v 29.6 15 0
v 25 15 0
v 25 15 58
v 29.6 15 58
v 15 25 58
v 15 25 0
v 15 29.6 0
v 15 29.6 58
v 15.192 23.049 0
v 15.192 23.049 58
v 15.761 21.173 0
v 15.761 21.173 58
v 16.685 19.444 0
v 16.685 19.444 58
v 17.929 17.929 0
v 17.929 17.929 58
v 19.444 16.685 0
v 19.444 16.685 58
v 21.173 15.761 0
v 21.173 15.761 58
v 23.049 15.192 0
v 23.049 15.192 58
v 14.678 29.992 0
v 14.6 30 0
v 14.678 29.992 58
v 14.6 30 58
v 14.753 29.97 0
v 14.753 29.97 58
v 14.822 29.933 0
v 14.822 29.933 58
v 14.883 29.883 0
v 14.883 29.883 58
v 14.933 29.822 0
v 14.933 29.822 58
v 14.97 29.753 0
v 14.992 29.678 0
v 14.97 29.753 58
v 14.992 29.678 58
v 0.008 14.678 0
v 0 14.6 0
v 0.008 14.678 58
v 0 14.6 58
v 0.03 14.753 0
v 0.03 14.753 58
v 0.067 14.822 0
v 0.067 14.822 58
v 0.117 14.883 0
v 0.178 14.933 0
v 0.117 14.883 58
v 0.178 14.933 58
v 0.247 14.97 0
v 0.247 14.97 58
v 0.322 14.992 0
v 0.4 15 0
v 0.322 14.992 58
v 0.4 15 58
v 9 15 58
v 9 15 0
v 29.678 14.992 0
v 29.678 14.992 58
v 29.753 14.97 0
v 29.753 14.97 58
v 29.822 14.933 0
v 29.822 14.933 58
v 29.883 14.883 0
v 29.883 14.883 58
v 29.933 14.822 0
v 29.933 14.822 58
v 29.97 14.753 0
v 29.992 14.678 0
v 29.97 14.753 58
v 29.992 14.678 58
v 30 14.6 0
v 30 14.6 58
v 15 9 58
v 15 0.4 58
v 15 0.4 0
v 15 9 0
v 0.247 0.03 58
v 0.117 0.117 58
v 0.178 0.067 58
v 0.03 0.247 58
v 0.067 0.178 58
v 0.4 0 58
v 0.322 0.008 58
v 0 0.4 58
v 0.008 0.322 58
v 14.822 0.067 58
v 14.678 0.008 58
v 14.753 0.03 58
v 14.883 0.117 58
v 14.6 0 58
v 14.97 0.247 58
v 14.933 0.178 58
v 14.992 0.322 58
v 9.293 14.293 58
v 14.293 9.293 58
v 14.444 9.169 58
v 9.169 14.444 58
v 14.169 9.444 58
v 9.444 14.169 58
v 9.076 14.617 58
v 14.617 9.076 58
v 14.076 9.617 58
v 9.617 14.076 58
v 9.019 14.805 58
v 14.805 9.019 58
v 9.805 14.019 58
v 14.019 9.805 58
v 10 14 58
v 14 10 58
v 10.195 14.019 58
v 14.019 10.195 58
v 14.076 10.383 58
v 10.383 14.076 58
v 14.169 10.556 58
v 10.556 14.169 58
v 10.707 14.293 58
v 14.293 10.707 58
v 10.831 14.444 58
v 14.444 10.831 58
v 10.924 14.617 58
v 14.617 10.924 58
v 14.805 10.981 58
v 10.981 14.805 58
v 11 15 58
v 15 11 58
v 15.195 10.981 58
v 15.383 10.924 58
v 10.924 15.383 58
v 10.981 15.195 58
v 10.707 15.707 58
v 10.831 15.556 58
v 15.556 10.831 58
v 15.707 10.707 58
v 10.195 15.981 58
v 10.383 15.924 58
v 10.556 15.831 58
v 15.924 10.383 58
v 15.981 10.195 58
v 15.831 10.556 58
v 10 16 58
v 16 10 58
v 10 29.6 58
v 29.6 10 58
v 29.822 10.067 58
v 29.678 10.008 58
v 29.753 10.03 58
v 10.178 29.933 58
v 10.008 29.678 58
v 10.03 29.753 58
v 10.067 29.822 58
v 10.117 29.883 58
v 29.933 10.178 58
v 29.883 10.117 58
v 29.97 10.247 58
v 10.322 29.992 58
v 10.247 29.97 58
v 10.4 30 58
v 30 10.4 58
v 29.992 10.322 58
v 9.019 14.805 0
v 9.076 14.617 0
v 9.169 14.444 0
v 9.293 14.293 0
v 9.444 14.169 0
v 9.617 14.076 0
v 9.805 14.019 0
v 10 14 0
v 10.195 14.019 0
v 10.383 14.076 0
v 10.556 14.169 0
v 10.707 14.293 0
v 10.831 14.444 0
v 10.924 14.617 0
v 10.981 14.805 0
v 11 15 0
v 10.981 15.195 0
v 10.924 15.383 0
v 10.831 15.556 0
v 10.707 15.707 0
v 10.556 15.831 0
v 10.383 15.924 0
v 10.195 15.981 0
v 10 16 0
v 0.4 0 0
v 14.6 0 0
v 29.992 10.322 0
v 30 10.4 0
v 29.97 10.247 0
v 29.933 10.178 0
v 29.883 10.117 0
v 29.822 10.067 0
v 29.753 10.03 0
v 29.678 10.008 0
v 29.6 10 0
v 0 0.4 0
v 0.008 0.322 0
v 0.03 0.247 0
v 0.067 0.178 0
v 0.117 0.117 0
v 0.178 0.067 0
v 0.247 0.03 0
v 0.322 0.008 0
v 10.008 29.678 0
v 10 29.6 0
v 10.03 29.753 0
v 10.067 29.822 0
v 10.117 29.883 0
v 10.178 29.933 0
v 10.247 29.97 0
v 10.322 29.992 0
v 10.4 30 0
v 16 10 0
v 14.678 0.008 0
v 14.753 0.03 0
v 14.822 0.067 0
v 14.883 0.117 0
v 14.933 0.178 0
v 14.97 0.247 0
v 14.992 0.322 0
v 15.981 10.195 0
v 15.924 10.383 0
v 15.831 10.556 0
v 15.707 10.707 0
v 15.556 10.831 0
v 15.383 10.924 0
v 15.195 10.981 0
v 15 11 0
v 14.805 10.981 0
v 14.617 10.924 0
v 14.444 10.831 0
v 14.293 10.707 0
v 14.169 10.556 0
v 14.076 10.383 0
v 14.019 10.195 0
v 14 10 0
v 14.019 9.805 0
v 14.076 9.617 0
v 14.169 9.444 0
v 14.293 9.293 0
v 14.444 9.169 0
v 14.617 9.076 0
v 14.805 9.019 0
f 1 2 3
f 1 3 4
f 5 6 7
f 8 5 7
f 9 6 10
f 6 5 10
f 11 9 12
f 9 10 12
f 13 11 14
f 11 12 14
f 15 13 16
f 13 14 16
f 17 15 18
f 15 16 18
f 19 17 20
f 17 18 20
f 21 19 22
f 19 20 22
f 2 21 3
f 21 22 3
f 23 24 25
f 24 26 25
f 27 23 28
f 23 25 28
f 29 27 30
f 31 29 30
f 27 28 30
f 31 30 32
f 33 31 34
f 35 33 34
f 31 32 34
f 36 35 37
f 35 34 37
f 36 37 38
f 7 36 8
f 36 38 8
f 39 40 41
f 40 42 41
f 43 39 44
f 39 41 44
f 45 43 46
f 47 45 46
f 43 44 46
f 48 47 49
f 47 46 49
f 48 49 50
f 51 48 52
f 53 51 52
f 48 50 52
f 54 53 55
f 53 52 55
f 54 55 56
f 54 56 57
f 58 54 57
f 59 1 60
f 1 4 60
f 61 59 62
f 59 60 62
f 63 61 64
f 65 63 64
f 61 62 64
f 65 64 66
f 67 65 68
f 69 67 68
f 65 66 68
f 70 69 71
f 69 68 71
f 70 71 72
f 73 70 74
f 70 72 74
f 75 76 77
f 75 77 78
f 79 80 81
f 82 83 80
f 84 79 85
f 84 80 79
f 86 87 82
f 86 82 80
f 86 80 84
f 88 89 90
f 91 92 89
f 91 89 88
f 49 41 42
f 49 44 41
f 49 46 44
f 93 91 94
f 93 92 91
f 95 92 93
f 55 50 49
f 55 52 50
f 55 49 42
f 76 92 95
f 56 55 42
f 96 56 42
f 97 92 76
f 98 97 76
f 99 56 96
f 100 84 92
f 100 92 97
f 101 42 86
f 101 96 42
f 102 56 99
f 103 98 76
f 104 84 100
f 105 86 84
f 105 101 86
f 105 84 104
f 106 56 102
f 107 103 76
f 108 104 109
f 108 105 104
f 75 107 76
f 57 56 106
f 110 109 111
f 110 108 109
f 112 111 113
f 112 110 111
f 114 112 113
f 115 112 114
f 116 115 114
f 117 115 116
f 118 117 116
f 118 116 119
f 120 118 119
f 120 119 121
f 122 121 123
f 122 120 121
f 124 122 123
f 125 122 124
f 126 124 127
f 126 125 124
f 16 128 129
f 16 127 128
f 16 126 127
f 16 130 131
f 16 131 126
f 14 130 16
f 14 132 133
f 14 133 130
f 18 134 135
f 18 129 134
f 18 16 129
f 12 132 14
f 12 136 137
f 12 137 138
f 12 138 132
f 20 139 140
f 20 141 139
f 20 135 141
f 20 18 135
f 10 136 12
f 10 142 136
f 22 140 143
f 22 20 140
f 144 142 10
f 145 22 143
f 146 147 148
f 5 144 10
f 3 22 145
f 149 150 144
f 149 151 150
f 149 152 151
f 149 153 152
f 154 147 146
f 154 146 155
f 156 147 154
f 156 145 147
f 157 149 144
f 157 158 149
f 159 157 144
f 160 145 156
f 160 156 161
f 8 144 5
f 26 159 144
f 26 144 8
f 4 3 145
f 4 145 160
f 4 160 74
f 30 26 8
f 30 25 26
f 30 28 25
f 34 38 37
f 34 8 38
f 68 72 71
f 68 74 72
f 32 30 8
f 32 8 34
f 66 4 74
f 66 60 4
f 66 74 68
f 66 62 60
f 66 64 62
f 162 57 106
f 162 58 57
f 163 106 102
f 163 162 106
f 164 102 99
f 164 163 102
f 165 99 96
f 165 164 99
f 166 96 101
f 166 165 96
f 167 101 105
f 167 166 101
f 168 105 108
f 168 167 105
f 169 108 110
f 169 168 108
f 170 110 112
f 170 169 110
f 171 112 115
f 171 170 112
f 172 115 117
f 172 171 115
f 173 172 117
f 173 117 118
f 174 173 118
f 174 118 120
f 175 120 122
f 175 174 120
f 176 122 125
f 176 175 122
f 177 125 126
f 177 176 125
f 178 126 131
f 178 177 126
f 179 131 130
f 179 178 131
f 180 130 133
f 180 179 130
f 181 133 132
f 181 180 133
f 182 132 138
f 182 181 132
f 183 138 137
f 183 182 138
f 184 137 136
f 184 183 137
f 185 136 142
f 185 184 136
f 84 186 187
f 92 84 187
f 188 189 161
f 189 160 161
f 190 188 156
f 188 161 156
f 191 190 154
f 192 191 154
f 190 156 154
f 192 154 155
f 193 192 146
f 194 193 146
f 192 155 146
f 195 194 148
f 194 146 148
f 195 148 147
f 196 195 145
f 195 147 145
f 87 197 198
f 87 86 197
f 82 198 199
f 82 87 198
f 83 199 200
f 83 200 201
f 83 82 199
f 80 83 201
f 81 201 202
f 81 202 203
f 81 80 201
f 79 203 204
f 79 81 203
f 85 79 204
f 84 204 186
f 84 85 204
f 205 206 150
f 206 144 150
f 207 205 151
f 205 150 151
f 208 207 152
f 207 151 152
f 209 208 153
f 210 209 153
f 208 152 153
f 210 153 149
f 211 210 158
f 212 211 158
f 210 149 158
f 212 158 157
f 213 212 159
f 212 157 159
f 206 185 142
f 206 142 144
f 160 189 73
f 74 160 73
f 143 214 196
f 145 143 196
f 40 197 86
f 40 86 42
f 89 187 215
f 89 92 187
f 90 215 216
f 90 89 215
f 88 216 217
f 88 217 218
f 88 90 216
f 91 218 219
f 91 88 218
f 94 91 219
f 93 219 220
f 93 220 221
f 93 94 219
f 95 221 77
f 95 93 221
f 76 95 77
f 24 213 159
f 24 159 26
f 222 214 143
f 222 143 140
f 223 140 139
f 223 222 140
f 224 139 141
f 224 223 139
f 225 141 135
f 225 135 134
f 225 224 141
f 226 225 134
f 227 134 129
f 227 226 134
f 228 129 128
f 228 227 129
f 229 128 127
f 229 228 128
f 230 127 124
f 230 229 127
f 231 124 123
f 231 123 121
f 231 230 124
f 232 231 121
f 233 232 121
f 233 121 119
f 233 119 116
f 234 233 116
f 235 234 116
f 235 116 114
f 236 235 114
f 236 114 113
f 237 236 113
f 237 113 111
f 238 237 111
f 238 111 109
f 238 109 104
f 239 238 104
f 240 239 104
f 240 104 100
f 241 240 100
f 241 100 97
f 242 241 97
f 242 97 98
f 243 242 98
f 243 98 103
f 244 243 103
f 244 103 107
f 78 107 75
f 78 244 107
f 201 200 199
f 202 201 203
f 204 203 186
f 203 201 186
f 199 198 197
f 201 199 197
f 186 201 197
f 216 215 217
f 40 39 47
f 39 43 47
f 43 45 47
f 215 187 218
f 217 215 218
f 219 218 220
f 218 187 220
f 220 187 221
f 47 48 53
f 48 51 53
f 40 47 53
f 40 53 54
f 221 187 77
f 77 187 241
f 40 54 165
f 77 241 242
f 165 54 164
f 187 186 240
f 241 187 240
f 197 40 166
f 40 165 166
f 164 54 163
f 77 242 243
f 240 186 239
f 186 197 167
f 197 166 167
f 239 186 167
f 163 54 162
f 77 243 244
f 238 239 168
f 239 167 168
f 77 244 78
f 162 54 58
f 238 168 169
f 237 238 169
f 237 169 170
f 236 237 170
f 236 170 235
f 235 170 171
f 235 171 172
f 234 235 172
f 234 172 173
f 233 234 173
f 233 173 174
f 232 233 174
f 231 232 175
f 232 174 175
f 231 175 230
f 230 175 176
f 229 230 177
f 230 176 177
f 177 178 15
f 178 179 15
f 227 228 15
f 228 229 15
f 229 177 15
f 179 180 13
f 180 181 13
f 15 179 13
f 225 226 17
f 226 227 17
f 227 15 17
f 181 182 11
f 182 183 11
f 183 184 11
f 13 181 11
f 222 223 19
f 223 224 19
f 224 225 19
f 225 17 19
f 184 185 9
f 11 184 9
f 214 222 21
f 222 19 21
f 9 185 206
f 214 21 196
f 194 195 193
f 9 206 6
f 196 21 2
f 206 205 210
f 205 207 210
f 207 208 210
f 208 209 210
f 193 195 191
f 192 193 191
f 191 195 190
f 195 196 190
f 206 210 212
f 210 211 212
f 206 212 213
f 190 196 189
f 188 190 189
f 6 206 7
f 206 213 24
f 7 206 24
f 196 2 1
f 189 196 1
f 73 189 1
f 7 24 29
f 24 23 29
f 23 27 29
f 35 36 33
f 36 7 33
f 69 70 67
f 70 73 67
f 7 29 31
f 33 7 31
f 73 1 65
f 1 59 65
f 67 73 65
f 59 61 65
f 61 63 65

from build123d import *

# Parameters (mm, degrees)
BOX003_W          = 15
BOX003_H          = 15
BOX003_DEPTH      = 58
FILLET_R          = 10
CYLINDER_R        = 1
CYLINDER_DEPTH    = 58
CYLINDER001_R     = 1
CYLINDER001_DEPTH = 58
BOX002_W          = 10
BOX002_H          = 15
BOX002_DEPTH      = 58
BOX001_W          = 15
BOX001_H          = 10
BOX001_DEPTH      = 58
BOX_W             = 30
BOX_H             = 30
BOX_DEPTH         = 58
FILLET001_R       = 0.4


with BuildPart() as fillet_body:
    # Box003 → Box003 (new body)
    with BuildSketch(Plane(origin=(15, 15, 0), x_dir=(1, 0, 0), z_dir=(0, 0, 1))):
        with Locations((7.5, 7.5)):
            Rectangle(BOX003_W, BOX003_H)
    extrude(amount=BOX003_DEPTH)

    # Fillet
    fillet_edges = [fillet_body.edges().sort_by_distance(p)[0] for p in [
        (15, 15, 29),
    ]]
    fillet(fillet_edges, radius=FILLET_R)


with BuildPart() as cylinder:
    # Cylinder → Cylinder (new body)
    with BuildSketch(Plane(origin=(15, 10, 0), x_dir=(1, 0, 0), z_dir=(0, 0, 1))):
        Circle(CYLINDER_R)
    extrude(amount=CYLINDER_DEPTH)


with BuildPart() as cylinder001:
    # Cylinder001 → Cylinder001 (new body)
    with BuildSketch(Plane(origin=(10, 15, 0), x_dir=(1, 0, 0), z_dir=(0, 0, 1))):
        Circle(CYLINDER001_R)
    extrude(amount=CYLINDER001_DEPTH)


with BuildPart() as cube002:
    # Box002 → Box002 (new body)
    with BuildSketch(Plane(origin=(0, 15, 0), x_dir=(1, 0, 0), z_dir=(0, 0, 1))):
        with Locations((5, 7.5)):
            Rectangle(BOX002_W, BOX002_H)
    extrude(amount=BOX002_DEPTH)


with BuildPart() as cube001:
    # Box001 → Box001 (new body)
    with BuildSketch(Plane(origin=(15, 0, 0), x_dir=(1, 0, 0), z_dir=(0, 0, 1))):
        with Locations((7.5, 5)):
            Rectangle(BOX001_W, BOX001_H)
    extrude(amount=BOX001_DEPTH)


with BuildPart() as fillet001:
    # Box → Box (new body)
    with BuildSketch(Plane.XY):
        with Locations((15, 15)):
            Rectangle(BOX_W, BOX_H)
    extrude(amount=BOX_DEPTH)

    # Cut: cut Cube001
    add(cube001.part, mode=Mode.SUBTRACT)

    # Cut001: cut Cube002
    add(cube002.part, mode=Mode.SUBTRACT)

    # Cut002: cut Cylinder001
    add(cylinder001.part, mode=Mode.SUBTRACT)

    # Cut003: cut Cylinder
    add(cylinder.part, mode=Mode.SUBTRACT)

    # Cut004: cut Fillet body
    add(fillet_body.part, mode=Mode.SUBTRACT)

    # Fillet001
    fillet001_edges = [fillet001.edges().sort_by_distance(p)[0] for p in [
        (0, 15, 29),
        (0, 0, 29),
        (15, 0, 29),
        (15, 30, 29),
        (10, 30, 29),
        (30, 15, 29),
        (30, 10, 29),
    ]]
    fillet(fillet001_edges, radius=FILLET001_R)


solid = fillet001.part
